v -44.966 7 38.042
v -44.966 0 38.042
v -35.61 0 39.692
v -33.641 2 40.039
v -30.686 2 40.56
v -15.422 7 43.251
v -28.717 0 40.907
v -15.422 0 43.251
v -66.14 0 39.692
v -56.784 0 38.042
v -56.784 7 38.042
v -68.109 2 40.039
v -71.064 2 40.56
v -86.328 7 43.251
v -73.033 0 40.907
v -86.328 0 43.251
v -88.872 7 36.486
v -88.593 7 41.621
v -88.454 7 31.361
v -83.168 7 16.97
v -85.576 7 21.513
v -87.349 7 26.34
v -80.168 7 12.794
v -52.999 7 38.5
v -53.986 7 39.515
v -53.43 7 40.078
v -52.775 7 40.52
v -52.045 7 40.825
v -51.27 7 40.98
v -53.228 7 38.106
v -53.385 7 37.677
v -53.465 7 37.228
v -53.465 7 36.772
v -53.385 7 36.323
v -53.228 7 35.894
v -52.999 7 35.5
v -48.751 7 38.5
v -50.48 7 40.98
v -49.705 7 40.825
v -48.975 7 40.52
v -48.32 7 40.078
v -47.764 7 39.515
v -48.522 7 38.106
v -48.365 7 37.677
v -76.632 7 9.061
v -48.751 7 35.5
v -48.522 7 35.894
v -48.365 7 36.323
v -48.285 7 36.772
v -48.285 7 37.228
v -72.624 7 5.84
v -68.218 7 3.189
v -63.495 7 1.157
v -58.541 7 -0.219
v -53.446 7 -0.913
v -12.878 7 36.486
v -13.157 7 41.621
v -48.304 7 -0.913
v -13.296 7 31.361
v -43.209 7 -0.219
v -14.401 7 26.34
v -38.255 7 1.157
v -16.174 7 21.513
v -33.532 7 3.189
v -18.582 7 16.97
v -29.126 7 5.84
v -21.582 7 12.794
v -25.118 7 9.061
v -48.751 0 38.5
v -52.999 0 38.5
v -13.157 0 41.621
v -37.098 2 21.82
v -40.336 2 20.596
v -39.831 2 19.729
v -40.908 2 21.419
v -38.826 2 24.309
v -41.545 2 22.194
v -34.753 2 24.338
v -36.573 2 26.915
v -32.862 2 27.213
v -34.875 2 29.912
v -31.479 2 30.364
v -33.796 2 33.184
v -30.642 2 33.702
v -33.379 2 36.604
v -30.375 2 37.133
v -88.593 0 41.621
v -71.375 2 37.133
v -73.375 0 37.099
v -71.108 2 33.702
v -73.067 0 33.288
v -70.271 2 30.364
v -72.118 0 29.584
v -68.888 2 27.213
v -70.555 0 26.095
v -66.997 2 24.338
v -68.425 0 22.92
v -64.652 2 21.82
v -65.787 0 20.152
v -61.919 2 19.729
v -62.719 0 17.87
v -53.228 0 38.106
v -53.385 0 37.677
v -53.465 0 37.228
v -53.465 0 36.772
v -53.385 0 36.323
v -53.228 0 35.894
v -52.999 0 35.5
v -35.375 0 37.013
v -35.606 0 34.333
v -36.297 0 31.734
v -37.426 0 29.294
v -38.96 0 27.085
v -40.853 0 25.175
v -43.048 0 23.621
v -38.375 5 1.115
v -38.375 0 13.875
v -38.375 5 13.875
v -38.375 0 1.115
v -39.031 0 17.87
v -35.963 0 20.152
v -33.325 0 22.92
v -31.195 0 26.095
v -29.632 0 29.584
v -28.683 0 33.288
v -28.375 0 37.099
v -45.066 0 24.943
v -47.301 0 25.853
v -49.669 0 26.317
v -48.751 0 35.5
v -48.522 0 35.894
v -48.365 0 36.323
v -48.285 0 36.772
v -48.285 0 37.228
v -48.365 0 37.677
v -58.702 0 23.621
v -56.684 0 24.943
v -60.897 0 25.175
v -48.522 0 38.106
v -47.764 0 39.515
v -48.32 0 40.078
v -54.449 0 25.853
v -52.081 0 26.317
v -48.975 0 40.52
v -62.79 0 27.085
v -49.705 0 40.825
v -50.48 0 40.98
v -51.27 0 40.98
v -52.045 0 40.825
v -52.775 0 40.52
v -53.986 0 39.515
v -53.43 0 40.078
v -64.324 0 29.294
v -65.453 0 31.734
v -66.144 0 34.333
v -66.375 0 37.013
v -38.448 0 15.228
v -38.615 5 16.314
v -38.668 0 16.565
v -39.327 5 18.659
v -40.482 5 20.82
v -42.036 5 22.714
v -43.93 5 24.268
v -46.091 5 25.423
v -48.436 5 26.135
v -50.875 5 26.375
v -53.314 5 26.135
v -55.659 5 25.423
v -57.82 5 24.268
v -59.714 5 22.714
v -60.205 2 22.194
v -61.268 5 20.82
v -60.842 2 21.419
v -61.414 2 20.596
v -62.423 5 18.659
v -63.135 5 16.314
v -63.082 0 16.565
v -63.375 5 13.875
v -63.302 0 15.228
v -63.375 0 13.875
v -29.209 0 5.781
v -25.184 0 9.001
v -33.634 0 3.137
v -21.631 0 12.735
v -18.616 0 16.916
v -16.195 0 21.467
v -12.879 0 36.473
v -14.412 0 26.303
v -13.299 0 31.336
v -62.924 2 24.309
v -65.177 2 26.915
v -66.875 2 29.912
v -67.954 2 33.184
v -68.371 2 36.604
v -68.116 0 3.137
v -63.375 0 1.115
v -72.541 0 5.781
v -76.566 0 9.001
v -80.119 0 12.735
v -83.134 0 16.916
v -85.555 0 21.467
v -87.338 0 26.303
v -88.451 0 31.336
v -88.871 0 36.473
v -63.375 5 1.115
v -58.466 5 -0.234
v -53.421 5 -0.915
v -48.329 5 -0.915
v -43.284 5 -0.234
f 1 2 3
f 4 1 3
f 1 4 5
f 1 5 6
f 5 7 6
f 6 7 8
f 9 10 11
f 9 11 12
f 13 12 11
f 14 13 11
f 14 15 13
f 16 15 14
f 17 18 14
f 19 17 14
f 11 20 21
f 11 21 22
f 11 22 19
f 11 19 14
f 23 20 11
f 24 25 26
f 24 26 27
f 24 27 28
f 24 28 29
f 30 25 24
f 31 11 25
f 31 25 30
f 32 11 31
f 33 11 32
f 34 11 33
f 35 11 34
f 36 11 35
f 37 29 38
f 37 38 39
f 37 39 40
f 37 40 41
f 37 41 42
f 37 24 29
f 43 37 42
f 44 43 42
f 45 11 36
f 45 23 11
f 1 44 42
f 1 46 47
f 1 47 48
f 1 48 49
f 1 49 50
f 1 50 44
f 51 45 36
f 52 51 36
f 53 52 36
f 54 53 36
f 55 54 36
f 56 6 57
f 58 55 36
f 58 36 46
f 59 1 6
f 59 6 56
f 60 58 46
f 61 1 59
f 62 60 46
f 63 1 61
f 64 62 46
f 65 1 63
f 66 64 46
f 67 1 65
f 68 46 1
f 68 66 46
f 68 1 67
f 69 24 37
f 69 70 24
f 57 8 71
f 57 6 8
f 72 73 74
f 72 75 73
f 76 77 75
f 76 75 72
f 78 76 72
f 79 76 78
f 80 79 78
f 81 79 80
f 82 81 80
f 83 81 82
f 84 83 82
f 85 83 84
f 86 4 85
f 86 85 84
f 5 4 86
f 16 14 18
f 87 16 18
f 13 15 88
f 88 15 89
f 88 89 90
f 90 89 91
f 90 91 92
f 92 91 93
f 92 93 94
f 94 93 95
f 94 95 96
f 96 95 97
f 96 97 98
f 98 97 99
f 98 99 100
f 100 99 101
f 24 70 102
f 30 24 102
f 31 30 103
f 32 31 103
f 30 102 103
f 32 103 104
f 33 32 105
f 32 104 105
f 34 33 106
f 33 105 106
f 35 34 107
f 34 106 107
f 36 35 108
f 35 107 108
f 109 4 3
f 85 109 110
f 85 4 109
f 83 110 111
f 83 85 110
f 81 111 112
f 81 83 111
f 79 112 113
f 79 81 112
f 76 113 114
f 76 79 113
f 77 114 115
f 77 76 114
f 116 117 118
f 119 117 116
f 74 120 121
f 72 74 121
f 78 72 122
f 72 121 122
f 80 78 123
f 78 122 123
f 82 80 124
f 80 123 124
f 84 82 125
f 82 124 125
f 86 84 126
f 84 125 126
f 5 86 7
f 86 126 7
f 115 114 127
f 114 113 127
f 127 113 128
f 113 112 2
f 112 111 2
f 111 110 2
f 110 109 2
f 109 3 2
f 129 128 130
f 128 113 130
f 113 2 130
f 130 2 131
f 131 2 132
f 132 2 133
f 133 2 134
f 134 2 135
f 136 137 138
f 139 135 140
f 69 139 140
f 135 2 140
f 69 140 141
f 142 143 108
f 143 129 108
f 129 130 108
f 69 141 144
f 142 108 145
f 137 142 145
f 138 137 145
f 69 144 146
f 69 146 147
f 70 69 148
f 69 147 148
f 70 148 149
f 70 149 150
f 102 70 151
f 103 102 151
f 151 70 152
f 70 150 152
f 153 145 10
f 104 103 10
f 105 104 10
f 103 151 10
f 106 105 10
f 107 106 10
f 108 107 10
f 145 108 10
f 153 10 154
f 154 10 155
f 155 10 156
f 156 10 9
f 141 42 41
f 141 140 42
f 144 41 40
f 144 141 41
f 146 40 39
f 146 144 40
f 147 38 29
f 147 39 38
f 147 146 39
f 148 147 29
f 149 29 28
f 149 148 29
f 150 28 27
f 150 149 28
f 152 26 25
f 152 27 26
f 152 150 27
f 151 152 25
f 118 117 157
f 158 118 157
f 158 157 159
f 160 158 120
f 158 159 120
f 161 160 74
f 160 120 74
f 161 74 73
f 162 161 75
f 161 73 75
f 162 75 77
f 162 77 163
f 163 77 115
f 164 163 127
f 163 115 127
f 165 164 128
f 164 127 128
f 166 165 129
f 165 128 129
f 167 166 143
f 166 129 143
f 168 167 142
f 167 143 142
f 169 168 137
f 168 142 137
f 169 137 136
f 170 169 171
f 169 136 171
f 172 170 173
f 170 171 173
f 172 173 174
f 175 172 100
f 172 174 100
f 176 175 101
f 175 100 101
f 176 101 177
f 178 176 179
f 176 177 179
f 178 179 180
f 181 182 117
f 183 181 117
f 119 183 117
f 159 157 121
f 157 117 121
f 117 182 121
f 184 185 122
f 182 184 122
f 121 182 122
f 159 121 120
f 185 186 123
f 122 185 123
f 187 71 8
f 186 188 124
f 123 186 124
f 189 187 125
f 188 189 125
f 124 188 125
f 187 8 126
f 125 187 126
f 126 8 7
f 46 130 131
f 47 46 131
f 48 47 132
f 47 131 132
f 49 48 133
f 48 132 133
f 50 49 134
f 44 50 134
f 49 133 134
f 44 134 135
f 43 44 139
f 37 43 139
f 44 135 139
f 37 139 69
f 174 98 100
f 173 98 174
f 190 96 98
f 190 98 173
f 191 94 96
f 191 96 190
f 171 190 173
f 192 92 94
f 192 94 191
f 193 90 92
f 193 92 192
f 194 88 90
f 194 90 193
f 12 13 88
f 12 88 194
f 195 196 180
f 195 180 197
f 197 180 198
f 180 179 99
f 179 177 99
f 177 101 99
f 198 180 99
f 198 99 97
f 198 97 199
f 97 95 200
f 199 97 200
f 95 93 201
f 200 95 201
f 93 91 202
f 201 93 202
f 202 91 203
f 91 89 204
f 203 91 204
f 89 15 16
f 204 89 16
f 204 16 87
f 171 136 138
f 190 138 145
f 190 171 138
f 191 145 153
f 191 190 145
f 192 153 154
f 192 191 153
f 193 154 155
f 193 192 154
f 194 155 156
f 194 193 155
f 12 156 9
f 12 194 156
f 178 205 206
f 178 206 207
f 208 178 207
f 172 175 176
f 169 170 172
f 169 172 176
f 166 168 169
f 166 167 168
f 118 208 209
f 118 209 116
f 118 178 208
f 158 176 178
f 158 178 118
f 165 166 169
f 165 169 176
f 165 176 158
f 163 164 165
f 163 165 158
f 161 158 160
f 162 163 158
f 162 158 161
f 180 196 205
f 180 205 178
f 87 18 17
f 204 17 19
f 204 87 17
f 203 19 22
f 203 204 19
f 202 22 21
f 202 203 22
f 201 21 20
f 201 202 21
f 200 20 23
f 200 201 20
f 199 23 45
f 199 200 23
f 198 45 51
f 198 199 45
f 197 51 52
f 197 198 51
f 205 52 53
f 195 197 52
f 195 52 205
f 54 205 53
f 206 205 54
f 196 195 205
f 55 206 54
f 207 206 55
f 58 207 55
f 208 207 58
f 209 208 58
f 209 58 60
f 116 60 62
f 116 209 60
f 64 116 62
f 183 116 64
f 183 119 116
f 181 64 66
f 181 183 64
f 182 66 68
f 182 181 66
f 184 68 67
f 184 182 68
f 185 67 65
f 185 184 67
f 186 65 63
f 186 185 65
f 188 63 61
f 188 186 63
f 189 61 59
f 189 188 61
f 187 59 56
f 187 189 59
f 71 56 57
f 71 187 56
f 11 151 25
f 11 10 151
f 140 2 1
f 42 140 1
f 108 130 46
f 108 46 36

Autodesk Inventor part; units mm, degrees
ref_plane "YZ Plane" through (0, 0, 0) normal (1, 0, 0) x (0, 1, 0)
ref_plane "XZ Plane" through (0, 0, 0) normal (0, 1, 0) x (-1, 0, 0)
ref_plane "XY Plane" through (0, 0, 0) normal (0, 0, 1) x (1, 0, 0)
sketch "スケッチ1" plane through (0, 0, 0) normal (0, 1, 0) x (-1, 0, 0)
  arc A0 (54.8142, 37.6946) -> (46.9358, 37.6946) centre (50.875, 37) ccw
  circle A1 centre (50.875, 13.875) radius 12.5
  line L0 (50.875, 37) -> (87.3129, 43.425)
  line L1 (50.875, 37) -> (87.875, 37) construction
  line L2 (87.3129, 43.425) -> (50.875, 37)
  line L3 (50.875, 37) -> (14.4371, 43.425)
  arc A2 (13.4523, 43.5986) -> (88.2977, 43.5986) centre (50.875, 37) ccw
  line L4 (87.3129, 43.425) -> (88.2977, 43.5986)
  line L5 (13.4523, 43.5986) -> (14.4371, 43.425)
  point P0 (0, 0)
  dimension "d22" = 25
  dimension "d27" = 10
  dimension "d38" = 4
  dimension "d49" = 76
extrude "押し出し1" add sketch "スケッチ1" along normal blind 7
sketch "スケッチ2" plane through (0, 7, 0) normal (0, 1, 0) x (1, 0, 0)
  circle A0 centre (-50.875, -13.875) radius 12.5
  circle A1 centre (-50.875, -13.875) radius 12.5
  point P0 (0, 0)
extrude "押し出し2" add sketch "スケッチ2" against normal blind 2
sketch "スケッチ3" plane through (0, 0, 0) normal (0, -1, 0) x (1, 0, 0)
  circle A0 centre (-50.875, 13.875) radius 12.5 projected
  circle A1 centre (-50.875, 13.875) radius 12.5 projected
  line L0 (-63.375, 13.875) -> (-38.375, 13.875)
  line L1 (-38.375, 13.875) -> (-38.375, -3.3785)
  line L2 (-38.375, -3.3785) -> (-63.375, -3.3785)
  line L3 (-63.375, -3.3785) -> (-63.375, 13.875)
  line L4 (-46.9358, 37.6946) -> (-13.4523, 43.5986) projected
  line L5 (-88.2977, 43.5986) -> (-54.8142, 37.6946) projected
  arc A2 (-88.2977, 43.5986) -> (-13.4523, 43.5986) centre (-50.875, 37) ccw projected
  arc A3 (-46.9358, 37.6946) -> (-54.8142, 37.6946) centre (-50.875, 37) ccw projected
  point P0 (0, 0)
extrude "押し出し3" cut sketch "スケッチ3" against normal blind 5 contours L1 A2 L3 A0 | A0 L0 | L1 L2 L3 A2 picked at (-53.2419, 10.4459)
sketch "スケッチ4" plane through (0, 0, 0) normal (0, -1, 0) x (1, 0, 0)
  circle A0 centre (-50.875, 37) radius 2.6
  arc A1 (-38.375, 13.875) -> (-63.375, 13.875) centre (-50.875, 13.875) ccw projected
  line L0 (-63.375, 1.1148) -> (-63.375, 13.875) projected
  line L1 (-38.375, 13.875) -> (-38.375, 1.1148) projected
  line L2 (-46.9358, 37.6946) -> (-13.4523, 43.5986) projected
  line L3 (-52.9987, 38.5) -> (-48.7513, 38.5)
  line L4 (-42.875, 38.5) -> (-42.875, 38.4106)
  line L5 (-48.7513, 35.5) -> (-52.9987, 35.5)
  line L6 (-58.875, 38.4106) -> (-58.875, 38.5)
  arc A2 (-38.375, 1.1148) -> (-13.4523, 43.5986) centre (-50.875, 37) ccw projected
  line L7 (-88.2977, 43.5986) -> (-54.8142, 37.6946) projected
  arc A3 (-88.2977, 43.5986) -> (-63.375, 1.1148) centre (-50.875, 37) ccw projected
  arc A4 (-46.9358, 37.6946) -> (-54.8142, 37.6946) centre (-50.875, 37) ccw projected
  point P0 (0, 0)
  dimension "d12" = 5.2
  dimension "d47" = 3
extrude "押し出し4" cut sketch "スケッチ4" against normal blind 8 contours A0 L5 L3
chamfer "面取り1" distance 2 angle 45 4 edges at (-88.2977, 3.5, 43.5986) (-46.9358, 3.5, 37.6946) (-13.4523, 3.5, 43.5986) (-54.8142, 3.5, 37.6946)
sketch "スケッチ8" plane through (0, 7, 0) normal (0, 1, 0) x (1, 0, 0)
  line L0 (-44.9662, -38.0419) -> (-15.4219, -43.2513) projected
  arc A0 (-48.7513, -38.5) -> (-48.7513, -35.5) centre (-50.875, -37) ccw projected
  arc A1 (-13.157, -41.6206) -> (-88.593, -41.6206) centre (-50.875, -37) ccw projected
  line L1 (-86.3281, -43.2513) -> (-56.7838, -38.0419) projected
  arc A2 (-52.9987, -35.5) -> (-52.9987, -38.5) centre (-50.875, -37) ccw projected
  line L2 (-52.9987, -35.5) -> (-48.7513, -35.5) projected
  line L3 (-48.7513, -38.5) -> (-52.9987, -38.5) projected
  arc A3 (-53.9856, -39.5148) -> (-47.7644, -39.5148) centre (-50.875, -37) ccw projected
  line L4 (-13.157, -41.6206) -> (-15.4219, -43.2513) projected
  line L5 (-86.3281, -43.2513) -> (-88.593, -41.6206) projected
  line L6 (-53.9856, -39.5148) -> (-56.7838, -38.0419) projected
  line L7 (-44.9662, -38.0419) -> (-47.7644, -39.5148) projected
  point P0 (0, 0)
extrude "押し出し8" cut sketch "スケッチ8" along normal blind 0.5 contours L3 A2 L2 A0
sketch "スケッチ9" plane through (0, 0, 0) normal (0, -1, 0) x (1, 0, 0)
  line L0 (-48.7513, 35.5) -> (-52.9987, 35.5) projected
  arc A0 (-52.9987, 38.5) -> (-52.9987, 35.5) centre (-50.875, 37) ccw projected
  arc A1 (-48.7513, 35.5) -> (-48.7513, 38.5) centre (-50.875, 37) ccw projected
  line L1 (-44.9662, 38.0419) -> (-15.4219, 43.2513) projected
  line L2 (-63.375, 1.1148) -> (-63.375, 13.875) projected
  arc A2 (-38.375, 13.875) -> (-63.375, 13.875) centre (-50.875, 13.875) ccw projected
  line L3 (-38.375, 13.875) -> (-38.375, 1.1148) projected
  circle A3 centre (-50.875, 37) radius 17.5
  circle A4 centre (-50.875, 37) radius 20.5
  circle A5 centre (-50.875, 37) radius 19
  line L4 (-86.3281, 43.2513) -> (-56.7838, 38.0419) projected
  arc A6 (-88.593, 41.6206) -> (-63.375, 1.1148) centre (-50.875, 37) ccw projected
  arc A7 (-38.375, 1.1148) -> (-13.157, 41.6206) centre (-50.875, 37) ccw projected
  line L5 (-52.9987, 38.5) -> (-48.7513, 38.5) projected
  arc A8 (-47.7644, 39.5148) -> (-53.9856, 39.5148) centre (-50.875, 37) ccw projected
  line L6 (-15.4219, 43.2513) -> (-13.157, 41.6206) projected
  line L7 (-47.7644, 39.5148) -> (-44.9662, 38.0419) projected
  line L8 (-56.7838, 38.0419) -> (-53.9856, 39.5148) projected
  line L9 (-88.593, 41.6206) -> (-86.3281, 43.2513) projected
  point P0 (0, 0)
  dimension "d39" = 35
  dimension "d40" = 41
  dimension "d41" = 38
extrude "押し出し9" cut sketch "スケッチ9" against normal blind 2 contours L0 A0 L5 A1 | A3 L4 A5 L1 | L1 A5 A2 A3 | A5 L4 A4 L1 | L1 A4 A2 A5 | A3 A2 A5 L4 | A5 A2 A4 L4 | A2 A5 A3 | A2 A4 A5
chamfer "面取り2" distance 2 angle 45 4 edges at (-69.646, 0, 28.7598) (-32.104, 0, 28.7598) (-66.8754, 0, 29.9123) (-34.8746, 0, 29.9123)
properties part number "RescueKitThrow-Joint"
